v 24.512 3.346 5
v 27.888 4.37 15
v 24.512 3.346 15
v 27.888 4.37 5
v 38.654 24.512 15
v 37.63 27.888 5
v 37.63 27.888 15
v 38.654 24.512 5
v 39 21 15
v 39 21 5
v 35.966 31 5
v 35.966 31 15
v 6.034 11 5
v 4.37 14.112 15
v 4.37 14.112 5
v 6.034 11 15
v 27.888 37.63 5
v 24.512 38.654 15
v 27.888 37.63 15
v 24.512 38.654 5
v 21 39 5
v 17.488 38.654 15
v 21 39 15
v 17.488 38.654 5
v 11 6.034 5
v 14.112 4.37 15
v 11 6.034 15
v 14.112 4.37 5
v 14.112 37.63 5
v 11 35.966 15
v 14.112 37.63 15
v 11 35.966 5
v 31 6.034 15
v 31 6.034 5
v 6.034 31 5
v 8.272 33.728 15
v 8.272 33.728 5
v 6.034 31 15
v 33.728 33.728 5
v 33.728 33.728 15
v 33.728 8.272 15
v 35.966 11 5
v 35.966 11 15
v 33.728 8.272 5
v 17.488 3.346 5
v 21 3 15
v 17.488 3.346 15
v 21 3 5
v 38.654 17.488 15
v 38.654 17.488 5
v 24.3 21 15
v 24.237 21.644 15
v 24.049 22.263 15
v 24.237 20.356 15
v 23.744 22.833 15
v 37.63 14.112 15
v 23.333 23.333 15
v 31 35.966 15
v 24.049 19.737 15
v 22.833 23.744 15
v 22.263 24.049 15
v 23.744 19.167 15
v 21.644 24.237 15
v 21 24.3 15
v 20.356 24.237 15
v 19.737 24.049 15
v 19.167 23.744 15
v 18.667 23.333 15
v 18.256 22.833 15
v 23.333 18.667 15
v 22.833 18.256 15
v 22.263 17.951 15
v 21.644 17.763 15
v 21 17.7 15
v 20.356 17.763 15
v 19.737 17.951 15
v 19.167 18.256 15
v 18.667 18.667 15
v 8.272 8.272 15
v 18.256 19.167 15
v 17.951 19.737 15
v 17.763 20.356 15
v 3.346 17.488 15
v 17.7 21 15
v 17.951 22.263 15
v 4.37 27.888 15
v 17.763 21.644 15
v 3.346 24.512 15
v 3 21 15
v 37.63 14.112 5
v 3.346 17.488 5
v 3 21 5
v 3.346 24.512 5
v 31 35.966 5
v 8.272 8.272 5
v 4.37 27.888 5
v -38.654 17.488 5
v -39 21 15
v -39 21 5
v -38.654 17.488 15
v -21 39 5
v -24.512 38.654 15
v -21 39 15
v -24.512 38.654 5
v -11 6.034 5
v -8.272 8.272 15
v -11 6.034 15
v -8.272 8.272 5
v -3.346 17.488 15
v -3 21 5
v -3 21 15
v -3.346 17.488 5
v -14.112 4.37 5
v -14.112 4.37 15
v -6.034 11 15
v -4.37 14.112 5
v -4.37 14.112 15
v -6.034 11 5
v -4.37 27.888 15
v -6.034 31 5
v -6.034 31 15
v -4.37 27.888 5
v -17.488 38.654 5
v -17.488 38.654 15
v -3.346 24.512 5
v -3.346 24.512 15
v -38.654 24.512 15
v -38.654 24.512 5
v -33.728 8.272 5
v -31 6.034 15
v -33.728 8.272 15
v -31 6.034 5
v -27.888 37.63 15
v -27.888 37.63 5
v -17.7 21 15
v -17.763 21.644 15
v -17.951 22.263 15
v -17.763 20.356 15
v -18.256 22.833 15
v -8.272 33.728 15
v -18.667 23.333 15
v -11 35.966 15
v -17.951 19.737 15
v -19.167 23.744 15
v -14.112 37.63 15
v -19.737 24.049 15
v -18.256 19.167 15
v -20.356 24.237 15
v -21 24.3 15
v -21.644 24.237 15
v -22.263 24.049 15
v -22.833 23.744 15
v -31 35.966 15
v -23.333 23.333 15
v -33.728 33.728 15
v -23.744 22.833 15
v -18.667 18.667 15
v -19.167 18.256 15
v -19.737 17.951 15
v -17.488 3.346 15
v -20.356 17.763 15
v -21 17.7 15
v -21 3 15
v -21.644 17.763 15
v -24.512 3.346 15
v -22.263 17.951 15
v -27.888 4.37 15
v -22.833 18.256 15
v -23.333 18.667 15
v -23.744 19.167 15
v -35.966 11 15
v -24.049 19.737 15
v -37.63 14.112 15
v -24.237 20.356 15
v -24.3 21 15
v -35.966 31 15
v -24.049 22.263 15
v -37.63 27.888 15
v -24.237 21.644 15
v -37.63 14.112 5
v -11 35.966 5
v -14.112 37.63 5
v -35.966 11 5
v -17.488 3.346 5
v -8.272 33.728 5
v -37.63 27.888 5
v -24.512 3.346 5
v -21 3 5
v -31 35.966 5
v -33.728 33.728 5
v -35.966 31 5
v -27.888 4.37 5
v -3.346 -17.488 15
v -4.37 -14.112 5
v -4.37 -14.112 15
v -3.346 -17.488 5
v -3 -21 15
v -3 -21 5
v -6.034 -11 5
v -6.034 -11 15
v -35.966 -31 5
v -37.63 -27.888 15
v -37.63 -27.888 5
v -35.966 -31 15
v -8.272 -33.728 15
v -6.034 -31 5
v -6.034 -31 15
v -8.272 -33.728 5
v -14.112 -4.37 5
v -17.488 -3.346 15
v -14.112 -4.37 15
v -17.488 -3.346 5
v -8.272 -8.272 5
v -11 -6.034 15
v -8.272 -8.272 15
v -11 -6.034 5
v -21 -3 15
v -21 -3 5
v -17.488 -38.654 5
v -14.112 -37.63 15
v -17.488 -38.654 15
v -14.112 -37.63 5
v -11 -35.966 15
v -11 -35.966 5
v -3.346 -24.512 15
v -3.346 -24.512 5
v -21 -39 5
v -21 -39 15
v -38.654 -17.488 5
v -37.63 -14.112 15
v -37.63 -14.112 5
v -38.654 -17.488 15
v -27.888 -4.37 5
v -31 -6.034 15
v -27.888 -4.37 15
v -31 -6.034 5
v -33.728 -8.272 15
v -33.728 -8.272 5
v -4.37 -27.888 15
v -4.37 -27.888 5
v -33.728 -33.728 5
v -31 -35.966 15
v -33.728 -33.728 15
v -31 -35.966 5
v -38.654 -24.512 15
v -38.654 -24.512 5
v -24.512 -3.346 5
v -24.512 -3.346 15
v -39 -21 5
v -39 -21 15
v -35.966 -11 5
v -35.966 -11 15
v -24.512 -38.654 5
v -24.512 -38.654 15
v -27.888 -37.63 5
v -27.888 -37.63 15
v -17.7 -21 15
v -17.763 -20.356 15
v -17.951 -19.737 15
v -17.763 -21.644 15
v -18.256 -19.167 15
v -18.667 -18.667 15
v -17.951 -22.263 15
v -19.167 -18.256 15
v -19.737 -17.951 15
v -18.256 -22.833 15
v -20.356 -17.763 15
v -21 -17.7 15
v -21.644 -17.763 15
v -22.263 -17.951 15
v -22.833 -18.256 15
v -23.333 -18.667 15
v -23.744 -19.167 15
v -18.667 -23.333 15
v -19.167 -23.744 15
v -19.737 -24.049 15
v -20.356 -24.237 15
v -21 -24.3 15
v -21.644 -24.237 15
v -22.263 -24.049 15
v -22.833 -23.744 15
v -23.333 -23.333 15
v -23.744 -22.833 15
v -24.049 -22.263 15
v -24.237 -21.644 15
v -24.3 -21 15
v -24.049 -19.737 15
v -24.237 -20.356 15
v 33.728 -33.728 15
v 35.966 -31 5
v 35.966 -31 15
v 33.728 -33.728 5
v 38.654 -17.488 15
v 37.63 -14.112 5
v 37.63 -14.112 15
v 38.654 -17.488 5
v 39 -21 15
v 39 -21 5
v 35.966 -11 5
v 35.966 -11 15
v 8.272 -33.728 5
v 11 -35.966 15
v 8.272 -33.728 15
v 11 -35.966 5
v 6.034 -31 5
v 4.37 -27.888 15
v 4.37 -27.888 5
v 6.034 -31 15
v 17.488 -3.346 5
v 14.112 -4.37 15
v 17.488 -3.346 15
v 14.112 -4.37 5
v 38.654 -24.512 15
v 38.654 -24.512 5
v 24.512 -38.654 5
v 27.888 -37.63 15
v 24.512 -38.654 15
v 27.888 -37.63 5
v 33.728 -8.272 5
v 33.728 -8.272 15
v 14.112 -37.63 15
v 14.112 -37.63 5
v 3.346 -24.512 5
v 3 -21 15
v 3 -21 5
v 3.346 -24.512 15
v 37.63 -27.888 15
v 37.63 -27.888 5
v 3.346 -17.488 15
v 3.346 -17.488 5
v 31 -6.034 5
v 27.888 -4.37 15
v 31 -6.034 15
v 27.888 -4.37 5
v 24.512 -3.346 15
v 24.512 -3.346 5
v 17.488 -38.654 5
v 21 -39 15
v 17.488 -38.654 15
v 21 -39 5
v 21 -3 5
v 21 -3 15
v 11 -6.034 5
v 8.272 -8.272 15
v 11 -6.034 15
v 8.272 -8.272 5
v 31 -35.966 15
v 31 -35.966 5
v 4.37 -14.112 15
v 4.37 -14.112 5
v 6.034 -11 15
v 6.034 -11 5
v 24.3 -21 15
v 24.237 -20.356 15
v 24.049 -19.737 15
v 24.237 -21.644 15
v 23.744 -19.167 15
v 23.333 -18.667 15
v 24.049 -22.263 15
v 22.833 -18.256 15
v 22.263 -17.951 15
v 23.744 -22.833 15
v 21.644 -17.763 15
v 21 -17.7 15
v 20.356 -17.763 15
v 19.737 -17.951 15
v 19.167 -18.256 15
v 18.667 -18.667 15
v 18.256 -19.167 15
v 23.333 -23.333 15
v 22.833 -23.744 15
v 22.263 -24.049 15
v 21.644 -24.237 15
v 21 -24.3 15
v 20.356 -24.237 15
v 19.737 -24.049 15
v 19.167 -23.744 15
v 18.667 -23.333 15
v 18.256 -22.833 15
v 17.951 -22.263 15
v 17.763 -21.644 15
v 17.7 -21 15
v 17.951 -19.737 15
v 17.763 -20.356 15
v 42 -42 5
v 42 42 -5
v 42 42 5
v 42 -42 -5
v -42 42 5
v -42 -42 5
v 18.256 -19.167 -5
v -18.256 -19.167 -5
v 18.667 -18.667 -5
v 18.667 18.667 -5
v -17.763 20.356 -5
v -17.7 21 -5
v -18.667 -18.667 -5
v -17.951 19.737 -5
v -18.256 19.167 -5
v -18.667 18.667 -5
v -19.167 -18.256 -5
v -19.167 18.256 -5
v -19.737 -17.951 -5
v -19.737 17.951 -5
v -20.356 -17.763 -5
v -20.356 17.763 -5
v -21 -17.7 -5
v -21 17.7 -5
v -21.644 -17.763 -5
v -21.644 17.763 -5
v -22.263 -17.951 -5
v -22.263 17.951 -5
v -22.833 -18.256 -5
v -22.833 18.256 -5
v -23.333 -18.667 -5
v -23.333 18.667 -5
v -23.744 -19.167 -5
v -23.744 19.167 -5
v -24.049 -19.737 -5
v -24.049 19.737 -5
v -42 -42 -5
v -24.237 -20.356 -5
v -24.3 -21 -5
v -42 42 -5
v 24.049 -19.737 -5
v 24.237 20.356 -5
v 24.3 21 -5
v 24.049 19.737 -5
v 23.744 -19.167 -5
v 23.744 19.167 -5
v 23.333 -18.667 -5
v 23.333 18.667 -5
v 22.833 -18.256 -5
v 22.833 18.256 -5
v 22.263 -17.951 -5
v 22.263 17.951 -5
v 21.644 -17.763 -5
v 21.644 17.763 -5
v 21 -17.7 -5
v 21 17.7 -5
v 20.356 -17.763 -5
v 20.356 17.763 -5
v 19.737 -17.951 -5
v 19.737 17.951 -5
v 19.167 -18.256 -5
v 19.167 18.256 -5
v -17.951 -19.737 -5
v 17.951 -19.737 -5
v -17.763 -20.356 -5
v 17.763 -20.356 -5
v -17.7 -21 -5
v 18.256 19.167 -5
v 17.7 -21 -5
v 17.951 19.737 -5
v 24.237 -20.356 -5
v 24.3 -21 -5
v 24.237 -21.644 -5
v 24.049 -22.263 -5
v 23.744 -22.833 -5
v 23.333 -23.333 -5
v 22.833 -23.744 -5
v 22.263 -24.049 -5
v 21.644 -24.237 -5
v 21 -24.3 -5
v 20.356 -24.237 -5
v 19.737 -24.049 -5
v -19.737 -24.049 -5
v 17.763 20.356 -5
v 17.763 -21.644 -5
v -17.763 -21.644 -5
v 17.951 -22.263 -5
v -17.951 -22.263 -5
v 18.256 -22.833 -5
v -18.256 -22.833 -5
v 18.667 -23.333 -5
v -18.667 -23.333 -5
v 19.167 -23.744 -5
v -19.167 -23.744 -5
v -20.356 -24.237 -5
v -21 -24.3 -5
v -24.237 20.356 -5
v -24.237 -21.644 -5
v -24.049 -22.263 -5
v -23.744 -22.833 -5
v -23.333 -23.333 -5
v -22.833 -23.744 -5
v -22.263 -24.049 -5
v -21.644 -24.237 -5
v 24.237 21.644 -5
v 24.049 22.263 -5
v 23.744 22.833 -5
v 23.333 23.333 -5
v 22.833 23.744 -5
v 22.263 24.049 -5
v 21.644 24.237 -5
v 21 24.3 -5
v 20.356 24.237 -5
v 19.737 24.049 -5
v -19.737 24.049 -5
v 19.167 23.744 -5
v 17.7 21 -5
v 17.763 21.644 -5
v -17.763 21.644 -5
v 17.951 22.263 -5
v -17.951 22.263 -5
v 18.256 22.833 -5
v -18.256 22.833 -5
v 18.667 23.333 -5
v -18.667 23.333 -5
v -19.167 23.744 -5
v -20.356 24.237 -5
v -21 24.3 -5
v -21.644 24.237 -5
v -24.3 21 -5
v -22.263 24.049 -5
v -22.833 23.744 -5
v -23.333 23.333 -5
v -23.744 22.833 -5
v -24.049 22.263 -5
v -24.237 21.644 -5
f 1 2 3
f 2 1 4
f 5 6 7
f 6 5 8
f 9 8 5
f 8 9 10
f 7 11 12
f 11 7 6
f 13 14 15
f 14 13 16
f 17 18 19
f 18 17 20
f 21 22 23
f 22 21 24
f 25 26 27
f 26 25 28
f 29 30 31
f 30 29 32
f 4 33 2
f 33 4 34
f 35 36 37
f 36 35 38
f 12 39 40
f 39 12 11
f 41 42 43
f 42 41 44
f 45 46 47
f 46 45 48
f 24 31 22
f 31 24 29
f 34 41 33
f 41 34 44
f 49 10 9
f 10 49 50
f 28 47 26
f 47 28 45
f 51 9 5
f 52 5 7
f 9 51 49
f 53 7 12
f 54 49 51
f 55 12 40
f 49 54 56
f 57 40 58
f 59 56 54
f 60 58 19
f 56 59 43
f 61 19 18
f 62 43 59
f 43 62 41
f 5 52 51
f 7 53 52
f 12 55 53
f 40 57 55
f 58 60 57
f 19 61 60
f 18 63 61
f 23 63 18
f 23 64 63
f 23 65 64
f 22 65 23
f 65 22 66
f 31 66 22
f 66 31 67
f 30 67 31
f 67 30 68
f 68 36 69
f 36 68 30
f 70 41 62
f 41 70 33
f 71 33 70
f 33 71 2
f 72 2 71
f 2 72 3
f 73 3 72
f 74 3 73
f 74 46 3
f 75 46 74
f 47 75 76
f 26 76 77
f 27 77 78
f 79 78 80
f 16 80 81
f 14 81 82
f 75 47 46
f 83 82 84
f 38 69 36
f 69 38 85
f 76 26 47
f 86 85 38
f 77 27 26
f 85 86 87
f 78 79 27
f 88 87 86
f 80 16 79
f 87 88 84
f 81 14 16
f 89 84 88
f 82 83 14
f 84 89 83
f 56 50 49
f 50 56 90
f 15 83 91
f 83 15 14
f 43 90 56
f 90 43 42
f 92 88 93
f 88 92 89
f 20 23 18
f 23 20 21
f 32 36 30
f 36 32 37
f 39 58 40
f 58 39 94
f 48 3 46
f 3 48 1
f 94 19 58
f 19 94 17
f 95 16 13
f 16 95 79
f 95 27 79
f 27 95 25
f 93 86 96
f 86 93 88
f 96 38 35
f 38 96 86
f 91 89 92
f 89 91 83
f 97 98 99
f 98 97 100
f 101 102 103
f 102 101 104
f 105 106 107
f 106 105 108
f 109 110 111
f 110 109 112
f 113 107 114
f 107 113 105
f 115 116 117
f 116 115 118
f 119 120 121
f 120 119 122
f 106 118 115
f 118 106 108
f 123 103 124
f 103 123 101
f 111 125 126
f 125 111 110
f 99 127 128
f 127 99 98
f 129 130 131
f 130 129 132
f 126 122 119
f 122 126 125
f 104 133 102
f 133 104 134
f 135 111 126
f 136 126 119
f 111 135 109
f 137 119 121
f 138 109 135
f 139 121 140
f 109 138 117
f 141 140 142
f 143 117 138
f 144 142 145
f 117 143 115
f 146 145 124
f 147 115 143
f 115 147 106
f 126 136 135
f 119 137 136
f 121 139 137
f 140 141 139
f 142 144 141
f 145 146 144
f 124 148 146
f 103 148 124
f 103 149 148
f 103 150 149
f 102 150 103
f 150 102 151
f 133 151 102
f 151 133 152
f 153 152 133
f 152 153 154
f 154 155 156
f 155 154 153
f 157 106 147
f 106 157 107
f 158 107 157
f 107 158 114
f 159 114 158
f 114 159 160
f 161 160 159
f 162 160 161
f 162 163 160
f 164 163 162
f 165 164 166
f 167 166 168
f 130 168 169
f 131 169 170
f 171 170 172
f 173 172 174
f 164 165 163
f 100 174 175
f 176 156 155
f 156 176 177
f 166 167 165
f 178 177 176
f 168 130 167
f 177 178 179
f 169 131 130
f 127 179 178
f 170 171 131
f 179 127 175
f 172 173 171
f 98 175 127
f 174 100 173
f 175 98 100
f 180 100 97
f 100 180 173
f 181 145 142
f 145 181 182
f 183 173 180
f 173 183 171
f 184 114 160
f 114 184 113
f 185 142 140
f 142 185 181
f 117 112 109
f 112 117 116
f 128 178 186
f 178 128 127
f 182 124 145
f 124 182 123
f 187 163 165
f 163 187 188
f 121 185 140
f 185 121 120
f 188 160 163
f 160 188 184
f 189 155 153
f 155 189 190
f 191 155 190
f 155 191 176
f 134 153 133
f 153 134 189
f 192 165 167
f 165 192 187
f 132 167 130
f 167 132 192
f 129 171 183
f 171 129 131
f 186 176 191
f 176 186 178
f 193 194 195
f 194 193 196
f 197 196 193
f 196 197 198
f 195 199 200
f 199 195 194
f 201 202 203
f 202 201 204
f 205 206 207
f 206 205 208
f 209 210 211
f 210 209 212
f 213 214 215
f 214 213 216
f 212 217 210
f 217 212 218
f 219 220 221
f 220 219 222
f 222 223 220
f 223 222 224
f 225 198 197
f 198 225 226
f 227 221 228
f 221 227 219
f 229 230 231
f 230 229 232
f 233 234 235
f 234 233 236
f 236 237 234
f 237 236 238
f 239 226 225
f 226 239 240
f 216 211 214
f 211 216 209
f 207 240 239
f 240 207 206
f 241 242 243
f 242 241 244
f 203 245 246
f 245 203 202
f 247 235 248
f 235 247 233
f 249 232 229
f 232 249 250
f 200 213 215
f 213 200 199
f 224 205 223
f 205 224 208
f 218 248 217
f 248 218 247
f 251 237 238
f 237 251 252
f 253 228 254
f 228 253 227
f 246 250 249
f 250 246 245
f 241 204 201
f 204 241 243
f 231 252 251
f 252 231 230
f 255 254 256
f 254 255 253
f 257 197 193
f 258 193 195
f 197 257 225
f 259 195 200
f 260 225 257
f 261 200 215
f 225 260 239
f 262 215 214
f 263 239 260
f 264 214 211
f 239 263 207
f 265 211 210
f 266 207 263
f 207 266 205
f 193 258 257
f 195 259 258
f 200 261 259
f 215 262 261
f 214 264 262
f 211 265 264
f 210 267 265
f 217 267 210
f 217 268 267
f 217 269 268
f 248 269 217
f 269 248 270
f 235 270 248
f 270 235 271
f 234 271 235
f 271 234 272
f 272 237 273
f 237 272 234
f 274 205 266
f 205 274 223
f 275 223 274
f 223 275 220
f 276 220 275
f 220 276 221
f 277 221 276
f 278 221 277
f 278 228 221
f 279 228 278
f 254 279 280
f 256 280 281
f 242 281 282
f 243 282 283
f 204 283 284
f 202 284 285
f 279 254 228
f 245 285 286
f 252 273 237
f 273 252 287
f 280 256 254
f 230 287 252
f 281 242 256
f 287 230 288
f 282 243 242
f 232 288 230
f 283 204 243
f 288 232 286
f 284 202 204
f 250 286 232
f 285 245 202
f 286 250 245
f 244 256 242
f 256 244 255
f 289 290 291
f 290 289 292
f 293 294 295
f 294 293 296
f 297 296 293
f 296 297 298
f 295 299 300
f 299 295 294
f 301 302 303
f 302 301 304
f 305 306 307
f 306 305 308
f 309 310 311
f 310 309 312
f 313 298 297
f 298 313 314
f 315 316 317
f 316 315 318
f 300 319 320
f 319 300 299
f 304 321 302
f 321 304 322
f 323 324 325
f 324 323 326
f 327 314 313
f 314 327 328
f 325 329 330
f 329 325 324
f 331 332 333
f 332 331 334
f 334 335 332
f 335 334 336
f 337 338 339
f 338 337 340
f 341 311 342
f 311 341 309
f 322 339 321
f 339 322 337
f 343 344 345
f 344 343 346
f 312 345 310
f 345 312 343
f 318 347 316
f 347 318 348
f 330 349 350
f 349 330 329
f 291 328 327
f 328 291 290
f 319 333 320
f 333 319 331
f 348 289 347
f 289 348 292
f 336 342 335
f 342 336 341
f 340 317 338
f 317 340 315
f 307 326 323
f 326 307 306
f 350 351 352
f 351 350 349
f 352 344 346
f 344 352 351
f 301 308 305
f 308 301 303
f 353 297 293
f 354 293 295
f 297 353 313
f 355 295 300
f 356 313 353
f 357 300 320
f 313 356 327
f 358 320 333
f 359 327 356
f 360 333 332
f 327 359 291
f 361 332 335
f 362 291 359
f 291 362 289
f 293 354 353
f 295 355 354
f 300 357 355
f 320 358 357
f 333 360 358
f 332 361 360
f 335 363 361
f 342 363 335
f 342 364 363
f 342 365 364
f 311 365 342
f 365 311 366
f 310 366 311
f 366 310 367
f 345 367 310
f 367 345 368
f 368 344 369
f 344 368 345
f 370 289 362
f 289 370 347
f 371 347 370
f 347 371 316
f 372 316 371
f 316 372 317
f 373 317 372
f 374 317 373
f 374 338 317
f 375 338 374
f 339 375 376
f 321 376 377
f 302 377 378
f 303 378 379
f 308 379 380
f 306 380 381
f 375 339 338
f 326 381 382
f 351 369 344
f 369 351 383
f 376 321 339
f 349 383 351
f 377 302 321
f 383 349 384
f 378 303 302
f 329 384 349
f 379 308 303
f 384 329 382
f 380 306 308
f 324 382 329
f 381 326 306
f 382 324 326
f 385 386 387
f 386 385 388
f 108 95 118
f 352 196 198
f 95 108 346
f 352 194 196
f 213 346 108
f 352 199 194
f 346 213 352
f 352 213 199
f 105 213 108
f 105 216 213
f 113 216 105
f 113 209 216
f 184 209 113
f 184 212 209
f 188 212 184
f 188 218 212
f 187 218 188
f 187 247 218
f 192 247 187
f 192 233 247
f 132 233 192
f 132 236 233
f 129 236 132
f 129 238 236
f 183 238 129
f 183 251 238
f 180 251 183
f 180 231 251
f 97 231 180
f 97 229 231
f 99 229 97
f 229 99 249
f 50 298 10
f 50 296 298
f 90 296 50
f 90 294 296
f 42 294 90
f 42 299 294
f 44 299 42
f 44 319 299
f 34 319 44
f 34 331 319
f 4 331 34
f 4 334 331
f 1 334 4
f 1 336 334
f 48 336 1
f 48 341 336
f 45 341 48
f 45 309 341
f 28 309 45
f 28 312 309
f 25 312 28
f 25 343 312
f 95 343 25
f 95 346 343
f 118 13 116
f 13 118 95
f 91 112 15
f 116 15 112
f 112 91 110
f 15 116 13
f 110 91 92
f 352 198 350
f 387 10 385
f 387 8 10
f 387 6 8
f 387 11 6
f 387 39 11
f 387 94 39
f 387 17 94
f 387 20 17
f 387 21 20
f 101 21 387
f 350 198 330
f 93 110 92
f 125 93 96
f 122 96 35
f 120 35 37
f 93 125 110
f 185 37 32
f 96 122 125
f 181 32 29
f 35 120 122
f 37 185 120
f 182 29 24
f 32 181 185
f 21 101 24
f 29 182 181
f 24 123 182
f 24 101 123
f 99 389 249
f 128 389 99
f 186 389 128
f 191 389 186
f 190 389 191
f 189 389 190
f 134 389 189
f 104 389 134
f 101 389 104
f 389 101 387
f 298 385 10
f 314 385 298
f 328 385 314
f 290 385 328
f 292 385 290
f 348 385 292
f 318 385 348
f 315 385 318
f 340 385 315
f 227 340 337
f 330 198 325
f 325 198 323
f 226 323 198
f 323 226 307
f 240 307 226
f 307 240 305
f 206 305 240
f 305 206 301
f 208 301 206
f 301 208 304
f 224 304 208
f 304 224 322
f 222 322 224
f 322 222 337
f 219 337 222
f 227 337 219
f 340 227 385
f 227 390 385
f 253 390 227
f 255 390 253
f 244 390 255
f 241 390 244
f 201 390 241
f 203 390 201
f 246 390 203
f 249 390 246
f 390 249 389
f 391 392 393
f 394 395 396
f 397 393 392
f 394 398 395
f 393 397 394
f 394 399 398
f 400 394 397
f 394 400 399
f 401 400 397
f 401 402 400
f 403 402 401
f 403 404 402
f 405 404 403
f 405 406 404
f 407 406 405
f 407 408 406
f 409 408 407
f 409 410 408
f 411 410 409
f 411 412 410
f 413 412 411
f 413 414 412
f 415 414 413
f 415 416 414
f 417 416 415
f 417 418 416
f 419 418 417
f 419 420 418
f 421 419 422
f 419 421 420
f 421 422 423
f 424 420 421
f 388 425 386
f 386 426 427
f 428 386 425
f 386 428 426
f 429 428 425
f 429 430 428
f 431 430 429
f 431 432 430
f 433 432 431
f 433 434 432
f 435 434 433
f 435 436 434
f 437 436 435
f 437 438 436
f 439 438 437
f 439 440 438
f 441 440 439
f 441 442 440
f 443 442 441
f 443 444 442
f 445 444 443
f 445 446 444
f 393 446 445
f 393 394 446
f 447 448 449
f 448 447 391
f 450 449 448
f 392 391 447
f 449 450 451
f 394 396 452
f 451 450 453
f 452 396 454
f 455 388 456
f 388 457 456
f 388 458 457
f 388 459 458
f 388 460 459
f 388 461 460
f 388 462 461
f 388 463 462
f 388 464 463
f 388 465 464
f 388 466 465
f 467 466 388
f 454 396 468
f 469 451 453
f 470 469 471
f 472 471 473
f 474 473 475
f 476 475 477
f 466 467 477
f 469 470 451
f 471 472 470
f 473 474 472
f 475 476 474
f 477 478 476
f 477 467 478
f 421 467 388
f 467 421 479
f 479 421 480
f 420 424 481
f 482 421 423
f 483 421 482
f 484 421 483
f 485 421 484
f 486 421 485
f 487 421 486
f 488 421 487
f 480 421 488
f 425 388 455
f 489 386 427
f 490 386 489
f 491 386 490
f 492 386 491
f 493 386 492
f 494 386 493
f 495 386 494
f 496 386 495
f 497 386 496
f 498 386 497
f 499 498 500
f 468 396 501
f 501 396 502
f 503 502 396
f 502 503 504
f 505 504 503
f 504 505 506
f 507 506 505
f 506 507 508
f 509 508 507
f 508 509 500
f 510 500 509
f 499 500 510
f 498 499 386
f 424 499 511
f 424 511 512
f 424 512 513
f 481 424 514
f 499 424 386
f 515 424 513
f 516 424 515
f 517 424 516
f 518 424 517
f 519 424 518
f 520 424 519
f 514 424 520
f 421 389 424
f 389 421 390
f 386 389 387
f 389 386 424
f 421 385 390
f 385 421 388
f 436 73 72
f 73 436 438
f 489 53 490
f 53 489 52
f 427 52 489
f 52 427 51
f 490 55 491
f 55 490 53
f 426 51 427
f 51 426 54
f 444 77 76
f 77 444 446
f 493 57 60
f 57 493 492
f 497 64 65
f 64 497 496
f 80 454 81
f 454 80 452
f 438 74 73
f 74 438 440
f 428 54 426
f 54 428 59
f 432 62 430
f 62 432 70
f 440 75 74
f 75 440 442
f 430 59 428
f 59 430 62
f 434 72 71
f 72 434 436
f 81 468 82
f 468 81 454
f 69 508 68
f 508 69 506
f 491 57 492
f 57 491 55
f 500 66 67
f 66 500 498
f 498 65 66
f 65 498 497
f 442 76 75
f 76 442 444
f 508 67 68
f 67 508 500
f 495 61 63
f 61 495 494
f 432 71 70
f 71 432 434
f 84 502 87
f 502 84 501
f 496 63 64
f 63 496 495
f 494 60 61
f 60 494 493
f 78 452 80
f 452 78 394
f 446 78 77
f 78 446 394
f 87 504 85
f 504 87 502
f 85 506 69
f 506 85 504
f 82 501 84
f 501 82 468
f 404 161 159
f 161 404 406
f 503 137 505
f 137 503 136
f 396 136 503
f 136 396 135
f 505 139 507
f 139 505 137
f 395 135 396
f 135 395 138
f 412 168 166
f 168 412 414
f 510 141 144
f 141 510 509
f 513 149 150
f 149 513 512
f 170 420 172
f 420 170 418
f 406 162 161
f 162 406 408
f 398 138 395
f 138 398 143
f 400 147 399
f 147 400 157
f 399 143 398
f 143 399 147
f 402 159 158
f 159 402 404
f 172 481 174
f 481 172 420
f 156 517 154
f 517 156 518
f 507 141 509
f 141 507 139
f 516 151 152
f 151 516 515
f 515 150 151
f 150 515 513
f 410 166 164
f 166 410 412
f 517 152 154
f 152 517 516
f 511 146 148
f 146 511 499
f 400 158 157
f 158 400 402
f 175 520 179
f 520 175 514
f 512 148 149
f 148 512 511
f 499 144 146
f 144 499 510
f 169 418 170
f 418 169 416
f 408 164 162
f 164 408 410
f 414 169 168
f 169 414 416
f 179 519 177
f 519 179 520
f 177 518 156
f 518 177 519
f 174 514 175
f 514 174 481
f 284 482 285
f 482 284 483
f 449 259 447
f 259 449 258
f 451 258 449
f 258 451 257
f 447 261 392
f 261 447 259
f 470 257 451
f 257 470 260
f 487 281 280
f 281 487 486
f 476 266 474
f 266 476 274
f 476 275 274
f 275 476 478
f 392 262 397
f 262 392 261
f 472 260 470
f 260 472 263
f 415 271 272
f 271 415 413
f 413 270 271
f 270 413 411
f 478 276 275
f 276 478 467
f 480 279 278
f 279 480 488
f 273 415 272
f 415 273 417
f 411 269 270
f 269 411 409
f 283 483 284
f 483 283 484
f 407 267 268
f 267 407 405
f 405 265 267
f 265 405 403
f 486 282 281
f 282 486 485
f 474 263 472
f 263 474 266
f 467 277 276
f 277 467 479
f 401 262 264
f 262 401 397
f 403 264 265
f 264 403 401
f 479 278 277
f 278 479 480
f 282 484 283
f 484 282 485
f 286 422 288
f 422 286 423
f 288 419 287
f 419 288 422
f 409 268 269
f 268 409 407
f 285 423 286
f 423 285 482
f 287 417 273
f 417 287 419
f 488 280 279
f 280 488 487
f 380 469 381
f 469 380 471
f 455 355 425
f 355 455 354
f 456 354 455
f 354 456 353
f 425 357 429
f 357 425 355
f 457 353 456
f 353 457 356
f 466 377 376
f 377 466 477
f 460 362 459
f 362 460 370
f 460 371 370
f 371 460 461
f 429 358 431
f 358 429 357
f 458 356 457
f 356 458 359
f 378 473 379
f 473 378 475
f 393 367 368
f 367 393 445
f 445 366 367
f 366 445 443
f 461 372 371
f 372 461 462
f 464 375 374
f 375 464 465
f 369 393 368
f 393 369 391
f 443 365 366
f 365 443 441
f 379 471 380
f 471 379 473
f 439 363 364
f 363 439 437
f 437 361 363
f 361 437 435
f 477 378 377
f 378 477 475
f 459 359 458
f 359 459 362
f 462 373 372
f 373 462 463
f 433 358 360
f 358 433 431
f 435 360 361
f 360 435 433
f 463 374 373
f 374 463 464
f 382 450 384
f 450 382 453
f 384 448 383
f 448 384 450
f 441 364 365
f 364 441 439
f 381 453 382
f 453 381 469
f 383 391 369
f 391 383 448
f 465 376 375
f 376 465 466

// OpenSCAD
$fn = 32;

// ----------------------------------------------------------------------
// Anchor pads 84 x 84 x 20
// four corner bosses with anchor holes
// ----------------------------------------------------------------------

// --- parameters (mm) ---
plate = [84, 84, 10];  // base plate size (x, y, z)
pads = 4;              // boss count, one per corner
edge = 21;             // boss centre offset from the plate edge
boss_d = 36;           // boss diameter
boss_h = 10;           // boss height above the base plate
hole_d = 6.6;          // hole diameter

// --- derived feature positions (mm) ---
height = plate[2] + boss_h;      // = 20   overall height of the part
corner_x = plate[0] / 2 - edge;  // = 21   boss centre X
corner_y = plate[1] / 2 - edge;  // = 21   boss centre Y
feature_centers = [
  [corner_x, corner_y],
  [-corner_x, corner_y],
  [-corner_x, -corner_y],
  [corner_x, -corner_y]
];   // boss centres, anchor holes are drilled there

// base plate, four bosses standing on it, anchor holes all the way through
difference() {
  union() {
    cube(plate, center = true);
    for (centre = feature_centers)
      translate([centre[0], centre[1], plate[2] / 2 - 1])
        cylinder(d = boss_d, h = boss_h + 1);
  }
  for (centre = feature_centers)
    translate([centre[0], centre[1], -height])
      cylinder(d = hole_d, h = 2 * height + 2);  // through boss and plate
}
